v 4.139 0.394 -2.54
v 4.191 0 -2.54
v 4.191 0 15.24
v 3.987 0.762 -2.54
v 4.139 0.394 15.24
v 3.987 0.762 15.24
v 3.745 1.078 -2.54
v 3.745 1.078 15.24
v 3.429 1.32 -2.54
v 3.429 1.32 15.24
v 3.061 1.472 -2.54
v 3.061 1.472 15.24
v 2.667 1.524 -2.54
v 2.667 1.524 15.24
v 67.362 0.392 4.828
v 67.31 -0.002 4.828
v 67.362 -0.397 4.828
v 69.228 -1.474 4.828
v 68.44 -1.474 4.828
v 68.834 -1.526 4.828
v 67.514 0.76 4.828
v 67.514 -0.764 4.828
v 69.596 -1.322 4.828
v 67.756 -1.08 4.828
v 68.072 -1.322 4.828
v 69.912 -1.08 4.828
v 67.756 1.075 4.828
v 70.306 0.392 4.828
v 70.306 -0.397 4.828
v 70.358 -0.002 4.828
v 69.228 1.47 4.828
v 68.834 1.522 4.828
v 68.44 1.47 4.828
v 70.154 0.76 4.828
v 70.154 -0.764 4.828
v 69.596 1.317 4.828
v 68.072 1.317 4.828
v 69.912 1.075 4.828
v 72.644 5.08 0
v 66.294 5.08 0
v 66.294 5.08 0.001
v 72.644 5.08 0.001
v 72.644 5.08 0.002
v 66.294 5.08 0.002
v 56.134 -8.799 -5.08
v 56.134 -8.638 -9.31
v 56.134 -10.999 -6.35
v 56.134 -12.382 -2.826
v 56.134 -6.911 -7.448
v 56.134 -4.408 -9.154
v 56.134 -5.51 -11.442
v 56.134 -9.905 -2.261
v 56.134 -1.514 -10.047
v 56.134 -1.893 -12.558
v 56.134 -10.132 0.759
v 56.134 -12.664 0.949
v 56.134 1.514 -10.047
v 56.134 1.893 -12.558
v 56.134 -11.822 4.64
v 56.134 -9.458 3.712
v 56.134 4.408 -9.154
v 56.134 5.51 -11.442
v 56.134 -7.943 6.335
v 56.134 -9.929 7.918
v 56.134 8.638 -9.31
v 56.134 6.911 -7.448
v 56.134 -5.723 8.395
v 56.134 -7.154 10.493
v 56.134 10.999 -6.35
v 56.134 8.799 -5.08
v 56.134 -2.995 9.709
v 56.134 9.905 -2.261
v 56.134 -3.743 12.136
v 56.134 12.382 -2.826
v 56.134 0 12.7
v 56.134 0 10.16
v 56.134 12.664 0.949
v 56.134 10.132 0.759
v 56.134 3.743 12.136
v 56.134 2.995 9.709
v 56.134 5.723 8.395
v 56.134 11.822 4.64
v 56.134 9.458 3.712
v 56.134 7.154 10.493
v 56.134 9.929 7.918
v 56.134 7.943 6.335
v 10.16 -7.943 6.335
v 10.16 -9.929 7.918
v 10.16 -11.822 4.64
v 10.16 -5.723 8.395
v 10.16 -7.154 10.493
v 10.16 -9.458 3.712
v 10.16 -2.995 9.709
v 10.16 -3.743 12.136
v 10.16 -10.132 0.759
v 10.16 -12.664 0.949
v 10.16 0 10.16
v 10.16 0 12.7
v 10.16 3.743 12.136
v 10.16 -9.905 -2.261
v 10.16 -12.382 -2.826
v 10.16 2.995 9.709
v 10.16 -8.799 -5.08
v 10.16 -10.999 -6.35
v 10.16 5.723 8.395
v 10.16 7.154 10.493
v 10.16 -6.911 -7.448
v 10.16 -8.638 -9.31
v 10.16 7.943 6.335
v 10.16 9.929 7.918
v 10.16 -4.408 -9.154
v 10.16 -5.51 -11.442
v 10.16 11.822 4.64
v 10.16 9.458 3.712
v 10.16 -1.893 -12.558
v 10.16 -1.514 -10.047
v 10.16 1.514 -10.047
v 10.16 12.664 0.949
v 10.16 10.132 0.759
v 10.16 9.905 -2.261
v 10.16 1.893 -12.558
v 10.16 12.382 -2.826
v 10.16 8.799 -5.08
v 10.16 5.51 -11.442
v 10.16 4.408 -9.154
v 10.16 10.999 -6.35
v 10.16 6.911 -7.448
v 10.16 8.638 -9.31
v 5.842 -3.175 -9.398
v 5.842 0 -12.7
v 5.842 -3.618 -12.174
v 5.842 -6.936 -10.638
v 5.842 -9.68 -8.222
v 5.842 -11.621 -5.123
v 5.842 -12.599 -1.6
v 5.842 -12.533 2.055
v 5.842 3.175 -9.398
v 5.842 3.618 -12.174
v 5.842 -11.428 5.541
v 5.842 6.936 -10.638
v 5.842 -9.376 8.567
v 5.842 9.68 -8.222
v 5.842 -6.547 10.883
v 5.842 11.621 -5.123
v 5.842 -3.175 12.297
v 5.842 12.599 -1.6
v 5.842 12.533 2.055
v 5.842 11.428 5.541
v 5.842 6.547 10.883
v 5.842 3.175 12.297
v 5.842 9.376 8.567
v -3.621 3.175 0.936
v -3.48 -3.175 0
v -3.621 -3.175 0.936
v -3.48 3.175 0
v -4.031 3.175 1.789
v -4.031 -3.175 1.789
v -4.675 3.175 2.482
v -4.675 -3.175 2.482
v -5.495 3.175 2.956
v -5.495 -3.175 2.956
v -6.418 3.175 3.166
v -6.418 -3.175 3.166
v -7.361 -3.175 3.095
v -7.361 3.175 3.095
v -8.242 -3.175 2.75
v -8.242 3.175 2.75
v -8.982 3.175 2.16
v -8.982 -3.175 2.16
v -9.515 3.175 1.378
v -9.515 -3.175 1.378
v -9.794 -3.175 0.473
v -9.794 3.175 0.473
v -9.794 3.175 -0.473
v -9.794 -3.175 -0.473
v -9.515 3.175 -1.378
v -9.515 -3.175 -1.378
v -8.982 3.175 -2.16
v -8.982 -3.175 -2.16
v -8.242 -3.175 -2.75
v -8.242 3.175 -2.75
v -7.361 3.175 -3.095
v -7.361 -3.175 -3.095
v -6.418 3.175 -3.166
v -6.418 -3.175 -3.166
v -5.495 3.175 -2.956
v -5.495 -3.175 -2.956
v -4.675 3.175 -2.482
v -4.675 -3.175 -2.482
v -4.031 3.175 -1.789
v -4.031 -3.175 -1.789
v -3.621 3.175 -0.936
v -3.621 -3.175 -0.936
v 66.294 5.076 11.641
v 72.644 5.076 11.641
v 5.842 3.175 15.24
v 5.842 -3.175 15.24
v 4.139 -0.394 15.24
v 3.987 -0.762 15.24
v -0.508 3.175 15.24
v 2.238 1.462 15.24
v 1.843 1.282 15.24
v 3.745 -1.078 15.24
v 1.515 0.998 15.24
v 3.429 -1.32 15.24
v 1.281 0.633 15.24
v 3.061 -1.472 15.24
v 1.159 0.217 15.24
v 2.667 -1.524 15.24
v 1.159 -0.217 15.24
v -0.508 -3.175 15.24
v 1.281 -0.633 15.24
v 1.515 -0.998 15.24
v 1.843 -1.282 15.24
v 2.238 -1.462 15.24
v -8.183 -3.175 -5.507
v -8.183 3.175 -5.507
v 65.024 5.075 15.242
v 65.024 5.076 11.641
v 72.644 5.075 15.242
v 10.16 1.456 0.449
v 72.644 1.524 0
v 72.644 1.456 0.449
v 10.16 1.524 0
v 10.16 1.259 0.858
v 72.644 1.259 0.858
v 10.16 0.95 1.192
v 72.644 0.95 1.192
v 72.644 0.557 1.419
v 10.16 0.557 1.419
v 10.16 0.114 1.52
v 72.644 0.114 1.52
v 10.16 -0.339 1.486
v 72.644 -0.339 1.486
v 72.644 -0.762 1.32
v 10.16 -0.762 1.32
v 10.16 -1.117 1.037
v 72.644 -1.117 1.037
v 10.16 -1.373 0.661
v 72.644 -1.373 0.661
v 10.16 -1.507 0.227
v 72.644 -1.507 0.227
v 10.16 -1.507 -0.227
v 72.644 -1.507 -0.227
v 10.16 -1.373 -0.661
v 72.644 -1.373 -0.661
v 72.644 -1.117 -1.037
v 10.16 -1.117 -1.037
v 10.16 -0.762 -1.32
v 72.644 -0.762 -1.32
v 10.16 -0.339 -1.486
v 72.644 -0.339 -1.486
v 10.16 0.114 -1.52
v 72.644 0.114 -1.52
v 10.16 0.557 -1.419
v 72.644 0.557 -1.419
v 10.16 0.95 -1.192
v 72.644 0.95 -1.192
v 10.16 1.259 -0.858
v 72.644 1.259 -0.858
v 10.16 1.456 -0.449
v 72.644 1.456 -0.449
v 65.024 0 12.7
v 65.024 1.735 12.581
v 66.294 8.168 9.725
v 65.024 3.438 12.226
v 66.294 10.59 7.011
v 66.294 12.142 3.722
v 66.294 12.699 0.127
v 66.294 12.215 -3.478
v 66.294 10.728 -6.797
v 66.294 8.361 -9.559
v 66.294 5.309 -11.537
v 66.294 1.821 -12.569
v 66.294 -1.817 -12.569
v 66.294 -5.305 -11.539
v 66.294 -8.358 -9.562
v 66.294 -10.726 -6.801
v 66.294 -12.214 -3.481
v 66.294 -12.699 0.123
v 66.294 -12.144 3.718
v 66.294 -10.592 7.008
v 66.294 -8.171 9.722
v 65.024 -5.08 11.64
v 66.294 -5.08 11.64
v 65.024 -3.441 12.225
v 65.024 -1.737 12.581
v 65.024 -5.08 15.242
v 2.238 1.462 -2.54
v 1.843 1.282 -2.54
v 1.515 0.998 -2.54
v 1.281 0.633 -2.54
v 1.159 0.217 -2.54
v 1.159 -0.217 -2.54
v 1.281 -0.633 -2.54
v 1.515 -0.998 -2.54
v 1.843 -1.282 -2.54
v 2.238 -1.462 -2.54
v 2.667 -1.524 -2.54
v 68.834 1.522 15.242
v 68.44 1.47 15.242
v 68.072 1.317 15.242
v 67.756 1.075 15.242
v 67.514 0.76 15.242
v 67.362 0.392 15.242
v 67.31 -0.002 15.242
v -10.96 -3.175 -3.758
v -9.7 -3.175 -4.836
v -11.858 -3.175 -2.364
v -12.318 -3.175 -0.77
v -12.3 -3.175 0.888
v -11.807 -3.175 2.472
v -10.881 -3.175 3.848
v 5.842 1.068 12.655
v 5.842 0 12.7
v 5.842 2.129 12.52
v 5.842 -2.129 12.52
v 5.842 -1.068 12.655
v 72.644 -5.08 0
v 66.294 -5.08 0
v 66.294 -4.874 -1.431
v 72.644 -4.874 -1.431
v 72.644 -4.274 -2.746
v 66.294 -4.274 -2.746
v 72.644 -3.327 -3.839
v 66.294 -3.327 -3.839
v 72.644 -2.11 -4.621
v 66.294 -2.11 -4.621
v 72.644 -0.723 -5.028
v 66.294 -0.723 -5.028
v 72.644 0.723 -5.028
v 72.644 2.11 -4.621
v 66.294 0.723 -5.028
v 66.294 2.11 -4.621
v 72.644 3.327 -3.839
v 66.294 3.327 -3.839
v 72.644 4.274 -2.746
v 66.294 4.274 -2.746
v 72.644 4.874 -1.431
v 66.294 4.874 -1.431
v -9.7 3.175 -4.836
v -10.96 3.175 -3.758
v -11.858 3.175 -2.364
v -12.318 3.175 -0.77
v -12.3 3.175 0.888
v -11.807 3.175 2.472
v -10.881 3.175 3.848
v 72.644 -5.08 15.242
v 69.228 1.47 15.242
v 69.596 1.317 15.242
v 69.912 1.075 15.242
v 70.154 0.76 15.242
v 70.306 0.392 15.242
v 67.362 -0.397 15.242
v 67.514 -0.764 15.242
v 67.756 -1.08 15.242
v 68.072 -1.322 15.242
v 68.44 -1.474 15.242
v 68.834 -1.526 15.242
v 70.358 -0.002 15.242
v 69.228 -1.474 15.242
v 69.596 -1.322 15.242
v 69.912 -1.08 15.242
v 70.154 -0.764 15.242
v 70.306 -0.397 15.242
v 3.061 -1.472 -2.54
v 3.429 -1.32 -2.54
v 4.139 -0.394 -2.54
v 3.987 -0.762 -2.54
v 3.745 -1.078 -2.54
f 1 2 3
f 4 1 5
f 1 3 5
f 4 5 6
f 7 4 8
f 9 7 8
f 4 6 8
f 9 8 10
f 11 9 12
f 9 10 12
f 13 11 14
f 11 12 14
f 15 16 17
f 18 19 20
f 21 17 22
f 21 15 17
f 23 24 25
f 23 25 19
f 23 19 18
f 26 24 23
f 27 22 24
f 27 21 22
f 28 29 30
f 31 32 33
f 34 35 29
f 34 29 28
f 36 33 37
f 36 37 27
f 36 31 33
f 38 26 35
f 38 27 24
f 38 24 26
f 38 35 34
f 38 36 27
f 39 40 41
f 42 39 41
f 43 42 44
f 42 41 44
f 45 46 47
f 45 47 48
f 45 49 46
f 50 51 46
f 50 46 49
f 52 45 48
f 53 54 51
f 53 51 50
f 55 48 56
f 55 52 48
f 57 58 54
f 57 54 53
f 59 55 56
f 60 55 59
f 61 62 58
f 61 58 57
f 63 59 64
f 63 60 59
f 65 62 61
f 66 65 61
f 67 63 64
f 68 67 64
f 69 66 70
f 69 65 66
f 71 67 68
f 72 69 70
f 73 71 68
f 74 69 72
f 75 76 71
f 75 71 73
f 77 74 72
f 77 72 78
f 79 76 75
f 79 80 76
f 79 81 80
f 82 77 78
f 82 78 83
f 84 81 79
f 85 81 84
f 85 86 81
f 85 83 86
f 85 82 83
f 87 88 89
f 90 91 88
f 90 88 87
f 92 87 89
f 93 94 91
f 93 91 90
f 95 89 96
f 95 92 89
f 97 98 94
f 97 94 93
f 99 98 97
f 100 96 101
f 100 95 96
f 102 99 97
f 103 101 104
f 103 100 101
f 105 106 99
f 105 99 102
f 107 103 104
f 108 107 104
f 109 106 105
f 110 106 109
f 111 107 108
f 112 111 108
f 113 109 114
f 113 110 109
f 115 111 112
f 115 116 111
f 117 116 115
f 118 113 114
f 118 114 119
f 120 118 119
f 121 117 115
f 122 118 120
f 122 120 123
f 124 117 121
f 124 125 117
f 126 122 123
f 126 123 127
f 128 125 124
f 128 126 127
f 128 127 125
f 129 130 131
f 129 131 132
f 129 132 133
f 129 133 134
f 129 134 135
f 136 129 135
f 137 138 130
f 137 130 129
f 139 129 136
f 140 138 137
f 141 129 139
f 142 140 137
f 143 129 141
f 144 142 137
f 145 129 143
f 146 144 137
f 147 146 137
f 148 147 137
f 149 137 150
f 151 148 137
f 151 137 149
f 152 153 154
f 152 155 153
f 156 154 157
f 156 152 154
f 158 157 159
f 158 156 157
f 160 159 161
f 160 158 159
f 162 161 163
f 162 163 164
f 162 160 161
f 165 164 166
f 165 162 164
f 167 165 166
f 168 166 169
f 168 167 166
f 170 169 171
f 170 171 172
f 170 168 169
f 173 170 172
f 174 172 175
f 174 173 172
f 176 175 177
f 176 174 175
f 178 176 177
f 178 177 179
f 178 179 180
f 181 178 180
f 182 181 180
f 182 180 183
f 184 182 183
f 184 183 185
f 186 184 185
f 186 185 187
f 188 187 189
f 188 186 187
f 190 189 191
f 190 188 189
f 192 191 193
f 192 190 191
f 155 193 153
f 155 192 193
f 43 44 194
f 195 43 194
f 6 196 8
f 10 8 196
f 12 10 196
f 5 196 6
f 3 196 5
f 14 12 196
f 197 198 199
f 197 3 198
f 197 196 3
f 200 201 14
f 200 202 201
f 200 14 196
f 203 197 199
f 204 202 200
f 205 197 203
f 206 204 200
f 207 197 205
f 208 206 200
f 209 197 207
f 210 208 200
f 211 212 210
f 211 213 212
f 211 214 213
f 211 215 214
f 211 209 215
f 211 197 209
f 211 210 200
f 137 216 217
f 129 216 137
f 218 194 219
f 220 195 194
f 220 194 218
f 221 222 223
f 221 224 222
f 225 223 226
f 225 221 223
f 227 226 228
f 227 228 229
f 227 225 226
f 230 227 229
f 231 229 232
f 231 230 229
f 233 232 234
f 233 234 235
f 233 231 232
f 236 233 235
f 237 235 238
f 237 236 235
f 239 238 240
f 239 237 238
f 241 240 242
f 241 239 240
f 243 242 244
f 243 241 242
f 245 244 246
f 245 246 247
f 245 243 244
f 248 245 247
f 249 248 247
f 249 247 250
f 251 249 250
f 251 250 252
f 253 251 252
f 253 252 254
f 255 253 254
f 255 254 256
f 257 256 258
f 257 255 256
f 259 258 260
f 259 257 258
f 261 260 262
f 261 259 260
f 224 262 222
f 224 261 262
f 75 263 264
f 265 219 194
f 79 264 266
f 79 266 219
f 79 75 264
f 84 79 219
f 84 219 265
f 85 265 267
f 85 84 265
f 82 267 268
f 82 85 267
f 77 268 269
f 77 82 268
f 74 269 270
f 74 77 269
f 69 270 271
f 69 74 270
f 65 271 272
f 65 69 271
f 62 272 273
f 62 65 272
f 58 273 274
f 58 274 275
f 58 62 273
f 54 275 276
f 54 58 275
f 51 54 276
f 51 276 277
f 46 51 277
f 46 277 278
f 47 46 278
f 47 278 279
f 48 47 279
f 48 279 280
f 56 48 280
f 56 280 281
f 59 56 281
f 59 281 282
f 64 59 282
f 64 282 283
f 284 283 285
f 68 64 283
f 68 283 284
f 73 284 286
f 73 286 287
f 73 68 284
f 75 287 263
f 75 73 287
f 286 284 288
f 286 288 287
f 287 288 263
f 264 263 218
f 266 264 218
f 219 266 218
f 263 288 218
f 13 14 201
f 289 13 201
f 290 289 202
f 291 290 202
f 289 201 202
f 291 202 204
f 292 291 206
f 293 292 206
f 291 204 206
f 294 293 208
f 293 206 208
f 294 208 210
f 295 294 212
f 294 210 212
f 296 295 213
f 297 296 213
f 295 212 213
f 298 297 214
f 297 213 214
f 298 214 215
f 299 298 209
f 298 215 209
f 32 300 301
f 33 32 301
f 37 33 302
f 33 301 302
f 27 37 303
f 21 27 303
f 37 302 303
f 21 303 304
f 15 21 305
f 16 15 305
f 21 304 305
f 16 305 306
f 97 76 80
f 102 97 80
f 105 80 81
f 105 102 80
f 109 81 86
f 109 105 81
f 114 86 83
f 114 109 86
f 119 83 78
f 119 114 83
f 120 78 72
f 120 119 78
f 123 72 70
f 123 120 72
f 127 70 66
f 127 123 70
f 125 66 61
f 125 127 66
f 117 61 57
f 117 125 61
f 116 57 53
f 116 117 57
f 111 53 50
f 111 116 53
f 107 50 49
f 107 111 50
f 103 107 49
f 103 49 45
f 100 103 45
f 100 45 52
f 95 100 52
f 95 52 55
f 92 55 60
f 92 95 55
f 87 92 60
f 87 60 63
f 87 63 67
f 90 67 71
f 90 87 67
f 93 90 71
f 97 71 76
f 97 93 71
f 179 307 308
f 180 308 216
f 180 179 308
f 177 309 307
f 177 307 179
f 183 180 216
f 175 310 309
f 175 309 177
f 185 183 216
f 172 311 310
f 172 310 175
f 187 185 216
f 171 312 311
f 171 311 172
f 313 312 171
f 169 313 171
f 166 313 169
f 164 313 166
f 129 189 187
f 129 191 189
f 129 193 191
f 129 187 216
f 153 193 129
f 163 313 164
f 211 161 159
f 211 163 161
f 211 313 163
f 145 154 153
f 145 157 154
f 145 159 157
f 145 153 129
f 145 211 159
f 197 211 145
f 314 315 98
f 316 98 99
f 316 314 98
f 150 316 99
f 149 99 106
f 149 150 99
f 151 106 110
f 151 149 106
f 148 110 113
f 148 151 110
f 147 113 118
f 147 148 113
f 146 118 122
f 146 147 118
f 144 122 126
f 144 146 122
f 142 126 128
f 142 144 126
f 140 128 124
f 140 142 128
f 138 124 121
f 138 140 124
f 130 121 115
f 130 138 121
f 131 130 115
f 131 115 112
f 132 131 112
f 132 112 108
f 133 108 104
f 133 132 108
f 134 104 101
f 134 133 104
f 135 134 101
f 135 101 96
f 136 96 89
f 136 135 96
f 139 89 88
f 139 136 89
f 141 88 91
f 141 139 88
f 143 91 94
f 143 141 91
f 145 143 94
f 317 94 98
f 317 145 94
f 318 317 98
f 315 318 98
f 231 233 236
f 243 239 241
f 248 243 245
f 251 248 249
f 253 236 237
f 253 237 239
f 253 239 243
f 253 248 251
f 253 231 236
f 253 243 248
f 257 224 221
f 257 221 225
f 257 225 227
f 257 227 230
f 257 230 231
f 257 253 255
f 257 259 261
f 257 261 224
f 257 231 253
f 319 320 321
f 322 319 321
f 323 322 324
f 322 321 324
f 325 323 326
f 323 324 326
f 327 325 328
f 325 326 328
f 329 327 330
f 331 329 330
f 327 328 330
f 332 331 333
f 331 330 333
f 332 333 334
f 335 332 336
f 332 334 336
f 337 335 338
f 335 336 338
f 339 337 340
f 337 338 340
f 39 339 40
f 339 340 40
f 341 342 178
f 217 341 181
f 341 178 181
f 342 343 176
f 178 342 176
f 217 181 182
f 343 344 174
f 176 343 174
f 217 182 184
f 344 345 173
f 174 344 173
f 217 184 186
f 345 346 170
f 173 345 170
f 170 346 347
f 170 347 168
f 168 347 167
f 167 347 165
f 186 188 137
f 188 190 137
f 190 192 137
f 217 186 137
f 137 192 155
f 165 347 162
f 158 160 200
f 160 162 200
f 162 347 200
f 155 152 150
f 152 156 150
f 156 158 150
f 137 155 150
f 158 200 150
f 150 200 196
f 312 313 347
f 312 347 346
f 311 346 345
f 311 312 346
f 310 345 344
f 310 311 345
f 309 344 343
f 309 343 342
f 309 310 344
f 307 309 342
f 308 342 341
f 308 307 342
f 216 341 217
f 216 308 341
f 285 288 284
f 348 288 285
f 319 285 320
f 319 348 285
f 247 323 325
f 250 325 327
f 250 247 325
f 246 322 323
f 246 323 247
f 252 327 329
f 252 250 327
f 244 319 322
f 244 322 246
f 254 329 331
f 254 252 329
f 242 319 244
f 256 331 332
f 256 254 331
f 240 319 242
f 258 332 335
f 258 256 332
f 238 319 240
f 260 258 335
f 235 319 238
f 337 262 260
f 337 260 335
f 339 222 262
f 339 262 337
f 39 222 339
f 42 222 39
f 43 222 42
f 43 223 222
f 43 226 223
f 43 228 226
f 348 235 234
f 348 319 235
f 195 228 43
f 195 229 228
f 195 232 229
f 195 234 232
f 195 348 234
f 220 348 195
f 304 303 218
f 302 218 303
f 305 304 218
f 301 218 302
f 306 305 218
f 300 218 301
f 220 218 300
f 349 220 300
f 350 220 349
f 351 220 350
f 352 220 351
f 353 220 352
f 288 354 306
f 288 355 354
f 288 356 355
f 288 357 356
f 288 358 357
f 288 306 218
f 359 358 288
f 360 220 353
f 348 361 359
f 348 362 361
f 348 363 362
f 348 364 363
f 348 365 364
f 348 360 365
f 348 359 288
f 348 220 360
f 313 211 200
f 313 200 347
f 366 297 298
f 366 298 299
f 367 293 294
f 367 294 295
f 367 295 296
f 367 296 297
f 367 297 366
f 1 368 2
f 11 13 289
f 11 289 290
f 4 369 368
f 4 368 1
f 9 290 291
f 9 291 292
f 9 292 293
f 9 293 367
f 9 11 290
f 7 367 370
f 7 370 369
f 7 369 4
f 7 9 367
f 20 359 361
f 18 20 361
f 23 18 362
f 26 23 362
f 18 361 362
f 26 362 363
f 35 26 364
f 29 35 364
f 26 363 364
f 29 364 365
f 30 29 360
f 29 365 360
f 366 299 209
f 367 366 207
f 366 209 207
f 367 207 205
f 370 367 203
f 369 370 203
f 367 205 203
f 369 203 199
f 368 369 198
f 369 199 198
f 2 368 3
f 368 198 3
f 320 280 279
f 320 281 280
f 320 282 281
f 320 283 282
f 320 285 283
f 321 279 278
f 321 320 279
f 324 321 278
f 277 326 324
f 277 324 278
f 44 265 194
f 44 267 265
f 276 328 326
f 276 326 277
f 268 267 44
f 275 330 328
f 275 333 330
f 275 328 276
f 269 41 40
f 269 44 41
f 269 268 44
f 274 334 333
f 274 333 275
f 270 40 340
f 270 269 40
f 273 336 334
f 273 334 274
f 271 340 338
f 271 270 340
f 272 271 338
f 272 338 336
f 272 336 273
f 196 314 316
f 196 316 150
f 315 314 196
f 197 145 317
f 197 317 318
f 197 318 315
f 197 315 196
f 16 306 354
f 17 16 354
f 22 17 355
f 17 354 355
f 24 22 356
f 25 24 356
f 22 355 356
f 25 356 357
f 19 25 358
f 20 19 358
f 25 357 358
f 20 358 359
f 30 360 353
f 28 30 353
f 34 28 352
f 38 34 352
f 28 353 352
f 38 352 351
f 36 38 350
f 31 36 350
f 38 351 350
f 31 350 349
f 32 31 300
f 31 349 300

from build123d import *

# Parameters (mm, degrees)
F0_R          = 3.175
F0_W          = 5.842
F0_H          = 12.7
F2_DEPTH      = 3.175
F2_DEPTH_BACK = 3.175
F3_R          = 1.524
F4_DEPTH      = 6.35
F4_DEPTH_BACK = 1.27
F5_DEPTH      = 56.134
F8_DEPTH      = 17.78
F9_DEPTH      = 10.414


with BuildPart() as f1:
    # F0 (on Front) → F1 (revolve)
    with BuildSketch(Plane.XZ):
        Polygon((5.842, 12.7), (5.842, 0), (66.294, 0), (66.294, 12.7), (56.134, 12.7), (56.134, 10.16), (10.16, 10.16), (10.16, 12.7), align=None)
    revolve(axis=Axis((-3.3274, 0, 0), (-1, 0, 0)))

    # F0 (on Front) → F2 (join, two sides)
    with BuildSketch(Plane.XZ) as f2_sk:
        with BuildLine():
            Line((5.842, 0), (0, 0))
            Line((0, 0), (-0.9398, 0))
            ThreePointArc((-0.9398, 0), (-3.1957909266, -4.5493385486), (-8.1826630726, -5.5069827884))
            Line((-8.1826630726, -5.5069827884), (5.842, -9.398))
            Line((5.842, -9.398), (5.842, 0))
        make_face()
        with BuildLine():
            Line((-0.9398, 0), (0, 0))
            Line((0, 0), (0, 12.7))
            Line((0, 12.7), (5.842, 12.7))
            Line((5.842, 12.7), (5.842, 15.24))
            Line((5.842, 15.24), (-0.508, 15.24))
            Line((-0.508, 15.24), (-10.8806298187, 3.8475430269))
            ThreePointArc((-10.8806298187, 3.8475430269), (-4.5919612295, 5.3297205562), (-0.9398, 0))
        make_face()
        with BuildLine():
            ThreePointArc((-8.1826630726, -5.5069827884), (-3.1957909266, -4.5493385486), (-0.9398, 0))
            ThreePointArc((-0.9398, 0), (-4.5919612295, 5.3297205562), (-10.8806298187, 3.8475430269))
            ThreePointArc((-10.8806298187, 3.8475430269), (-12.1459778134, -1.5837270034), (-8.1826630726, -5.5069827884))
        make_face()
        with Locations((-6.6548, 0)):
            Circle(F0_R, mode=Mode.SUBTRACT)
        with Locations((2.921, 6.35)):
            Rectangle(F0_W, F0_H)
    extrude(amount=F2_DEPTH)
    extrude(f2_sk.sketch, amount=-F2_DEPTH_BACK)

    # F3 (on face) → F4 (join, two sides)
    with BuildSketch(Plane.YZ.offset(66.294)) as f4_sk:
        with BuildLine():
            ThreePointArc((-5.08, 11.6397422652), (-0.0019395312, 12.6999998519), (5.0764445437, 11.6412933472))
            Line((5.0764445437, 11.6412933472), (5.0753448882, 15.241550914))
            Line((5.0753448882, 15.241550914), (-0.0176815379, 15.241550914))
            Line((-0.0176815379, 15.241550914), (-5.08, 15.241550914))
            Line((-5.08, 15.241550914), (-5.08, 11.6397422652))
        make_face()
        with BuildLine():
            ThreePointArc((-5.08, 0), (-0.0007758125, 5.0799999408), (5.079999763, 0.0015516249))
            Line((5.079999763, 0.0015516249), (5.0764445437, 11.6412933472))
            ThreePointArc((5.0764445437, 11.6412933472), (-0.0019395312, 12.6999998519), (-5.08, 11.6397422652))
            Line((-5.08, 11.6397422652), (-5.08, 0))
        make_face()
        with BuildLine():
            ThreePointArc((-5.08, 0), (0, -5.08), (5.08, 0))
            ThreePointArc((5.08, 0), (5.0799999408, 0.0007758125), (5.079999763, 0.0015516249))
            ThreePointArc((5.079999763, 0.0015516249), (-0.0007758125, 5.0799999408), (-5.08, 0))
        make_face()
        Circle(F3_R, mode=Mode.SUBTRACT)
    extrude(amount=F4_DEPTH)
    extrude(f4_sk.sketch, amount=-F4_DEPTH_BACK)

    # F5 (cut, through all): a face of the model
    f5_faces = [f1.faces().sort_by_distance(p)[0] for p in [
        (66.294, 0, 0),
    ]]
    extrude(f5_faces, amount=-F5_DEPTH, mode=Mode.SUBTRACT)

    # F6 (on face) → F8 (cut)
    with BuildSketch(Plane.XY.offset(15.24)):
        with BuildLine():
            ThreePointArc((2.667, -1.524), (3.7446307345, -1.0776307345), (4.191, 0))
            ThreePointArc((4.191, 0), (3.7446307345, 1.0776307345), (2.667, 1.524))
            Line((2.667, 1.524), (2.667, 0))
            Line((2.667, 0), (2.667, -1.524))
        make_face()
        with BuildLine():
            Line((2.667, 0), (2.667, 1.524))
            ThreePointArc((2.667, 1.524), (1.143, 0), (2.667, -1.524))
            Line((2.667, -1.524), (2.667, 0))
        make_face()
    extrude(amount=-F8_DEPTH, mode=Mode.SUBTRACT)

    # F7 (on face) → F9 (cut)
    with BuildSketch(Plane.XY.offset(15.241550914)):
        with BuildLine():
            Line((68.834, -0.0023275559), (68.834, 1.5216724441))
            ThreePointArc((68.834, 1.5216724441), (67.7563692655, 1.0753031786), (67.31, -0.0023275559))
            Line((67.31, -0.0023275559), (68.834, -0.0023275559))
        make_face()
        with BuildLine():
            ThreePointArc((70.358, -0.0023275559), (69.9116307345, 1.0753031786), (68.834, 1.5216724441))
            Line((68.834, 1.5216724441), (68.834, -0.0023275559))
            Line((68.834, -0.0023275559), (70.358, -0.0023275559))
        make_face()
        with BuildLine():
            Line((68.834, -1.5263275559), (68.834, -0.0023275559))
            Line((68.834, -0.0023275559), (67.31, -0.0023275559))
            ThreePointArc((67.31, -0.0023275559), (67.7563692655, -1.0799582904), (68.834, -1.5263275559))
        make_face()
        with BuildLine():
            Line((70.358, -0.0023275559), (68.834, -0.0023275559))
            Line((68.834, -0.0023275559), (68.834, -1.5263275559))
            ThreePointArc((68.834, -1.5263275559), (69.9116307345, -1.0799582904), (70.358, -0.0023275559))
        make_face()
    extrude(amount=-F9_DEPTH, mode=Mode.SUBTRACT)


solid = f1.part
